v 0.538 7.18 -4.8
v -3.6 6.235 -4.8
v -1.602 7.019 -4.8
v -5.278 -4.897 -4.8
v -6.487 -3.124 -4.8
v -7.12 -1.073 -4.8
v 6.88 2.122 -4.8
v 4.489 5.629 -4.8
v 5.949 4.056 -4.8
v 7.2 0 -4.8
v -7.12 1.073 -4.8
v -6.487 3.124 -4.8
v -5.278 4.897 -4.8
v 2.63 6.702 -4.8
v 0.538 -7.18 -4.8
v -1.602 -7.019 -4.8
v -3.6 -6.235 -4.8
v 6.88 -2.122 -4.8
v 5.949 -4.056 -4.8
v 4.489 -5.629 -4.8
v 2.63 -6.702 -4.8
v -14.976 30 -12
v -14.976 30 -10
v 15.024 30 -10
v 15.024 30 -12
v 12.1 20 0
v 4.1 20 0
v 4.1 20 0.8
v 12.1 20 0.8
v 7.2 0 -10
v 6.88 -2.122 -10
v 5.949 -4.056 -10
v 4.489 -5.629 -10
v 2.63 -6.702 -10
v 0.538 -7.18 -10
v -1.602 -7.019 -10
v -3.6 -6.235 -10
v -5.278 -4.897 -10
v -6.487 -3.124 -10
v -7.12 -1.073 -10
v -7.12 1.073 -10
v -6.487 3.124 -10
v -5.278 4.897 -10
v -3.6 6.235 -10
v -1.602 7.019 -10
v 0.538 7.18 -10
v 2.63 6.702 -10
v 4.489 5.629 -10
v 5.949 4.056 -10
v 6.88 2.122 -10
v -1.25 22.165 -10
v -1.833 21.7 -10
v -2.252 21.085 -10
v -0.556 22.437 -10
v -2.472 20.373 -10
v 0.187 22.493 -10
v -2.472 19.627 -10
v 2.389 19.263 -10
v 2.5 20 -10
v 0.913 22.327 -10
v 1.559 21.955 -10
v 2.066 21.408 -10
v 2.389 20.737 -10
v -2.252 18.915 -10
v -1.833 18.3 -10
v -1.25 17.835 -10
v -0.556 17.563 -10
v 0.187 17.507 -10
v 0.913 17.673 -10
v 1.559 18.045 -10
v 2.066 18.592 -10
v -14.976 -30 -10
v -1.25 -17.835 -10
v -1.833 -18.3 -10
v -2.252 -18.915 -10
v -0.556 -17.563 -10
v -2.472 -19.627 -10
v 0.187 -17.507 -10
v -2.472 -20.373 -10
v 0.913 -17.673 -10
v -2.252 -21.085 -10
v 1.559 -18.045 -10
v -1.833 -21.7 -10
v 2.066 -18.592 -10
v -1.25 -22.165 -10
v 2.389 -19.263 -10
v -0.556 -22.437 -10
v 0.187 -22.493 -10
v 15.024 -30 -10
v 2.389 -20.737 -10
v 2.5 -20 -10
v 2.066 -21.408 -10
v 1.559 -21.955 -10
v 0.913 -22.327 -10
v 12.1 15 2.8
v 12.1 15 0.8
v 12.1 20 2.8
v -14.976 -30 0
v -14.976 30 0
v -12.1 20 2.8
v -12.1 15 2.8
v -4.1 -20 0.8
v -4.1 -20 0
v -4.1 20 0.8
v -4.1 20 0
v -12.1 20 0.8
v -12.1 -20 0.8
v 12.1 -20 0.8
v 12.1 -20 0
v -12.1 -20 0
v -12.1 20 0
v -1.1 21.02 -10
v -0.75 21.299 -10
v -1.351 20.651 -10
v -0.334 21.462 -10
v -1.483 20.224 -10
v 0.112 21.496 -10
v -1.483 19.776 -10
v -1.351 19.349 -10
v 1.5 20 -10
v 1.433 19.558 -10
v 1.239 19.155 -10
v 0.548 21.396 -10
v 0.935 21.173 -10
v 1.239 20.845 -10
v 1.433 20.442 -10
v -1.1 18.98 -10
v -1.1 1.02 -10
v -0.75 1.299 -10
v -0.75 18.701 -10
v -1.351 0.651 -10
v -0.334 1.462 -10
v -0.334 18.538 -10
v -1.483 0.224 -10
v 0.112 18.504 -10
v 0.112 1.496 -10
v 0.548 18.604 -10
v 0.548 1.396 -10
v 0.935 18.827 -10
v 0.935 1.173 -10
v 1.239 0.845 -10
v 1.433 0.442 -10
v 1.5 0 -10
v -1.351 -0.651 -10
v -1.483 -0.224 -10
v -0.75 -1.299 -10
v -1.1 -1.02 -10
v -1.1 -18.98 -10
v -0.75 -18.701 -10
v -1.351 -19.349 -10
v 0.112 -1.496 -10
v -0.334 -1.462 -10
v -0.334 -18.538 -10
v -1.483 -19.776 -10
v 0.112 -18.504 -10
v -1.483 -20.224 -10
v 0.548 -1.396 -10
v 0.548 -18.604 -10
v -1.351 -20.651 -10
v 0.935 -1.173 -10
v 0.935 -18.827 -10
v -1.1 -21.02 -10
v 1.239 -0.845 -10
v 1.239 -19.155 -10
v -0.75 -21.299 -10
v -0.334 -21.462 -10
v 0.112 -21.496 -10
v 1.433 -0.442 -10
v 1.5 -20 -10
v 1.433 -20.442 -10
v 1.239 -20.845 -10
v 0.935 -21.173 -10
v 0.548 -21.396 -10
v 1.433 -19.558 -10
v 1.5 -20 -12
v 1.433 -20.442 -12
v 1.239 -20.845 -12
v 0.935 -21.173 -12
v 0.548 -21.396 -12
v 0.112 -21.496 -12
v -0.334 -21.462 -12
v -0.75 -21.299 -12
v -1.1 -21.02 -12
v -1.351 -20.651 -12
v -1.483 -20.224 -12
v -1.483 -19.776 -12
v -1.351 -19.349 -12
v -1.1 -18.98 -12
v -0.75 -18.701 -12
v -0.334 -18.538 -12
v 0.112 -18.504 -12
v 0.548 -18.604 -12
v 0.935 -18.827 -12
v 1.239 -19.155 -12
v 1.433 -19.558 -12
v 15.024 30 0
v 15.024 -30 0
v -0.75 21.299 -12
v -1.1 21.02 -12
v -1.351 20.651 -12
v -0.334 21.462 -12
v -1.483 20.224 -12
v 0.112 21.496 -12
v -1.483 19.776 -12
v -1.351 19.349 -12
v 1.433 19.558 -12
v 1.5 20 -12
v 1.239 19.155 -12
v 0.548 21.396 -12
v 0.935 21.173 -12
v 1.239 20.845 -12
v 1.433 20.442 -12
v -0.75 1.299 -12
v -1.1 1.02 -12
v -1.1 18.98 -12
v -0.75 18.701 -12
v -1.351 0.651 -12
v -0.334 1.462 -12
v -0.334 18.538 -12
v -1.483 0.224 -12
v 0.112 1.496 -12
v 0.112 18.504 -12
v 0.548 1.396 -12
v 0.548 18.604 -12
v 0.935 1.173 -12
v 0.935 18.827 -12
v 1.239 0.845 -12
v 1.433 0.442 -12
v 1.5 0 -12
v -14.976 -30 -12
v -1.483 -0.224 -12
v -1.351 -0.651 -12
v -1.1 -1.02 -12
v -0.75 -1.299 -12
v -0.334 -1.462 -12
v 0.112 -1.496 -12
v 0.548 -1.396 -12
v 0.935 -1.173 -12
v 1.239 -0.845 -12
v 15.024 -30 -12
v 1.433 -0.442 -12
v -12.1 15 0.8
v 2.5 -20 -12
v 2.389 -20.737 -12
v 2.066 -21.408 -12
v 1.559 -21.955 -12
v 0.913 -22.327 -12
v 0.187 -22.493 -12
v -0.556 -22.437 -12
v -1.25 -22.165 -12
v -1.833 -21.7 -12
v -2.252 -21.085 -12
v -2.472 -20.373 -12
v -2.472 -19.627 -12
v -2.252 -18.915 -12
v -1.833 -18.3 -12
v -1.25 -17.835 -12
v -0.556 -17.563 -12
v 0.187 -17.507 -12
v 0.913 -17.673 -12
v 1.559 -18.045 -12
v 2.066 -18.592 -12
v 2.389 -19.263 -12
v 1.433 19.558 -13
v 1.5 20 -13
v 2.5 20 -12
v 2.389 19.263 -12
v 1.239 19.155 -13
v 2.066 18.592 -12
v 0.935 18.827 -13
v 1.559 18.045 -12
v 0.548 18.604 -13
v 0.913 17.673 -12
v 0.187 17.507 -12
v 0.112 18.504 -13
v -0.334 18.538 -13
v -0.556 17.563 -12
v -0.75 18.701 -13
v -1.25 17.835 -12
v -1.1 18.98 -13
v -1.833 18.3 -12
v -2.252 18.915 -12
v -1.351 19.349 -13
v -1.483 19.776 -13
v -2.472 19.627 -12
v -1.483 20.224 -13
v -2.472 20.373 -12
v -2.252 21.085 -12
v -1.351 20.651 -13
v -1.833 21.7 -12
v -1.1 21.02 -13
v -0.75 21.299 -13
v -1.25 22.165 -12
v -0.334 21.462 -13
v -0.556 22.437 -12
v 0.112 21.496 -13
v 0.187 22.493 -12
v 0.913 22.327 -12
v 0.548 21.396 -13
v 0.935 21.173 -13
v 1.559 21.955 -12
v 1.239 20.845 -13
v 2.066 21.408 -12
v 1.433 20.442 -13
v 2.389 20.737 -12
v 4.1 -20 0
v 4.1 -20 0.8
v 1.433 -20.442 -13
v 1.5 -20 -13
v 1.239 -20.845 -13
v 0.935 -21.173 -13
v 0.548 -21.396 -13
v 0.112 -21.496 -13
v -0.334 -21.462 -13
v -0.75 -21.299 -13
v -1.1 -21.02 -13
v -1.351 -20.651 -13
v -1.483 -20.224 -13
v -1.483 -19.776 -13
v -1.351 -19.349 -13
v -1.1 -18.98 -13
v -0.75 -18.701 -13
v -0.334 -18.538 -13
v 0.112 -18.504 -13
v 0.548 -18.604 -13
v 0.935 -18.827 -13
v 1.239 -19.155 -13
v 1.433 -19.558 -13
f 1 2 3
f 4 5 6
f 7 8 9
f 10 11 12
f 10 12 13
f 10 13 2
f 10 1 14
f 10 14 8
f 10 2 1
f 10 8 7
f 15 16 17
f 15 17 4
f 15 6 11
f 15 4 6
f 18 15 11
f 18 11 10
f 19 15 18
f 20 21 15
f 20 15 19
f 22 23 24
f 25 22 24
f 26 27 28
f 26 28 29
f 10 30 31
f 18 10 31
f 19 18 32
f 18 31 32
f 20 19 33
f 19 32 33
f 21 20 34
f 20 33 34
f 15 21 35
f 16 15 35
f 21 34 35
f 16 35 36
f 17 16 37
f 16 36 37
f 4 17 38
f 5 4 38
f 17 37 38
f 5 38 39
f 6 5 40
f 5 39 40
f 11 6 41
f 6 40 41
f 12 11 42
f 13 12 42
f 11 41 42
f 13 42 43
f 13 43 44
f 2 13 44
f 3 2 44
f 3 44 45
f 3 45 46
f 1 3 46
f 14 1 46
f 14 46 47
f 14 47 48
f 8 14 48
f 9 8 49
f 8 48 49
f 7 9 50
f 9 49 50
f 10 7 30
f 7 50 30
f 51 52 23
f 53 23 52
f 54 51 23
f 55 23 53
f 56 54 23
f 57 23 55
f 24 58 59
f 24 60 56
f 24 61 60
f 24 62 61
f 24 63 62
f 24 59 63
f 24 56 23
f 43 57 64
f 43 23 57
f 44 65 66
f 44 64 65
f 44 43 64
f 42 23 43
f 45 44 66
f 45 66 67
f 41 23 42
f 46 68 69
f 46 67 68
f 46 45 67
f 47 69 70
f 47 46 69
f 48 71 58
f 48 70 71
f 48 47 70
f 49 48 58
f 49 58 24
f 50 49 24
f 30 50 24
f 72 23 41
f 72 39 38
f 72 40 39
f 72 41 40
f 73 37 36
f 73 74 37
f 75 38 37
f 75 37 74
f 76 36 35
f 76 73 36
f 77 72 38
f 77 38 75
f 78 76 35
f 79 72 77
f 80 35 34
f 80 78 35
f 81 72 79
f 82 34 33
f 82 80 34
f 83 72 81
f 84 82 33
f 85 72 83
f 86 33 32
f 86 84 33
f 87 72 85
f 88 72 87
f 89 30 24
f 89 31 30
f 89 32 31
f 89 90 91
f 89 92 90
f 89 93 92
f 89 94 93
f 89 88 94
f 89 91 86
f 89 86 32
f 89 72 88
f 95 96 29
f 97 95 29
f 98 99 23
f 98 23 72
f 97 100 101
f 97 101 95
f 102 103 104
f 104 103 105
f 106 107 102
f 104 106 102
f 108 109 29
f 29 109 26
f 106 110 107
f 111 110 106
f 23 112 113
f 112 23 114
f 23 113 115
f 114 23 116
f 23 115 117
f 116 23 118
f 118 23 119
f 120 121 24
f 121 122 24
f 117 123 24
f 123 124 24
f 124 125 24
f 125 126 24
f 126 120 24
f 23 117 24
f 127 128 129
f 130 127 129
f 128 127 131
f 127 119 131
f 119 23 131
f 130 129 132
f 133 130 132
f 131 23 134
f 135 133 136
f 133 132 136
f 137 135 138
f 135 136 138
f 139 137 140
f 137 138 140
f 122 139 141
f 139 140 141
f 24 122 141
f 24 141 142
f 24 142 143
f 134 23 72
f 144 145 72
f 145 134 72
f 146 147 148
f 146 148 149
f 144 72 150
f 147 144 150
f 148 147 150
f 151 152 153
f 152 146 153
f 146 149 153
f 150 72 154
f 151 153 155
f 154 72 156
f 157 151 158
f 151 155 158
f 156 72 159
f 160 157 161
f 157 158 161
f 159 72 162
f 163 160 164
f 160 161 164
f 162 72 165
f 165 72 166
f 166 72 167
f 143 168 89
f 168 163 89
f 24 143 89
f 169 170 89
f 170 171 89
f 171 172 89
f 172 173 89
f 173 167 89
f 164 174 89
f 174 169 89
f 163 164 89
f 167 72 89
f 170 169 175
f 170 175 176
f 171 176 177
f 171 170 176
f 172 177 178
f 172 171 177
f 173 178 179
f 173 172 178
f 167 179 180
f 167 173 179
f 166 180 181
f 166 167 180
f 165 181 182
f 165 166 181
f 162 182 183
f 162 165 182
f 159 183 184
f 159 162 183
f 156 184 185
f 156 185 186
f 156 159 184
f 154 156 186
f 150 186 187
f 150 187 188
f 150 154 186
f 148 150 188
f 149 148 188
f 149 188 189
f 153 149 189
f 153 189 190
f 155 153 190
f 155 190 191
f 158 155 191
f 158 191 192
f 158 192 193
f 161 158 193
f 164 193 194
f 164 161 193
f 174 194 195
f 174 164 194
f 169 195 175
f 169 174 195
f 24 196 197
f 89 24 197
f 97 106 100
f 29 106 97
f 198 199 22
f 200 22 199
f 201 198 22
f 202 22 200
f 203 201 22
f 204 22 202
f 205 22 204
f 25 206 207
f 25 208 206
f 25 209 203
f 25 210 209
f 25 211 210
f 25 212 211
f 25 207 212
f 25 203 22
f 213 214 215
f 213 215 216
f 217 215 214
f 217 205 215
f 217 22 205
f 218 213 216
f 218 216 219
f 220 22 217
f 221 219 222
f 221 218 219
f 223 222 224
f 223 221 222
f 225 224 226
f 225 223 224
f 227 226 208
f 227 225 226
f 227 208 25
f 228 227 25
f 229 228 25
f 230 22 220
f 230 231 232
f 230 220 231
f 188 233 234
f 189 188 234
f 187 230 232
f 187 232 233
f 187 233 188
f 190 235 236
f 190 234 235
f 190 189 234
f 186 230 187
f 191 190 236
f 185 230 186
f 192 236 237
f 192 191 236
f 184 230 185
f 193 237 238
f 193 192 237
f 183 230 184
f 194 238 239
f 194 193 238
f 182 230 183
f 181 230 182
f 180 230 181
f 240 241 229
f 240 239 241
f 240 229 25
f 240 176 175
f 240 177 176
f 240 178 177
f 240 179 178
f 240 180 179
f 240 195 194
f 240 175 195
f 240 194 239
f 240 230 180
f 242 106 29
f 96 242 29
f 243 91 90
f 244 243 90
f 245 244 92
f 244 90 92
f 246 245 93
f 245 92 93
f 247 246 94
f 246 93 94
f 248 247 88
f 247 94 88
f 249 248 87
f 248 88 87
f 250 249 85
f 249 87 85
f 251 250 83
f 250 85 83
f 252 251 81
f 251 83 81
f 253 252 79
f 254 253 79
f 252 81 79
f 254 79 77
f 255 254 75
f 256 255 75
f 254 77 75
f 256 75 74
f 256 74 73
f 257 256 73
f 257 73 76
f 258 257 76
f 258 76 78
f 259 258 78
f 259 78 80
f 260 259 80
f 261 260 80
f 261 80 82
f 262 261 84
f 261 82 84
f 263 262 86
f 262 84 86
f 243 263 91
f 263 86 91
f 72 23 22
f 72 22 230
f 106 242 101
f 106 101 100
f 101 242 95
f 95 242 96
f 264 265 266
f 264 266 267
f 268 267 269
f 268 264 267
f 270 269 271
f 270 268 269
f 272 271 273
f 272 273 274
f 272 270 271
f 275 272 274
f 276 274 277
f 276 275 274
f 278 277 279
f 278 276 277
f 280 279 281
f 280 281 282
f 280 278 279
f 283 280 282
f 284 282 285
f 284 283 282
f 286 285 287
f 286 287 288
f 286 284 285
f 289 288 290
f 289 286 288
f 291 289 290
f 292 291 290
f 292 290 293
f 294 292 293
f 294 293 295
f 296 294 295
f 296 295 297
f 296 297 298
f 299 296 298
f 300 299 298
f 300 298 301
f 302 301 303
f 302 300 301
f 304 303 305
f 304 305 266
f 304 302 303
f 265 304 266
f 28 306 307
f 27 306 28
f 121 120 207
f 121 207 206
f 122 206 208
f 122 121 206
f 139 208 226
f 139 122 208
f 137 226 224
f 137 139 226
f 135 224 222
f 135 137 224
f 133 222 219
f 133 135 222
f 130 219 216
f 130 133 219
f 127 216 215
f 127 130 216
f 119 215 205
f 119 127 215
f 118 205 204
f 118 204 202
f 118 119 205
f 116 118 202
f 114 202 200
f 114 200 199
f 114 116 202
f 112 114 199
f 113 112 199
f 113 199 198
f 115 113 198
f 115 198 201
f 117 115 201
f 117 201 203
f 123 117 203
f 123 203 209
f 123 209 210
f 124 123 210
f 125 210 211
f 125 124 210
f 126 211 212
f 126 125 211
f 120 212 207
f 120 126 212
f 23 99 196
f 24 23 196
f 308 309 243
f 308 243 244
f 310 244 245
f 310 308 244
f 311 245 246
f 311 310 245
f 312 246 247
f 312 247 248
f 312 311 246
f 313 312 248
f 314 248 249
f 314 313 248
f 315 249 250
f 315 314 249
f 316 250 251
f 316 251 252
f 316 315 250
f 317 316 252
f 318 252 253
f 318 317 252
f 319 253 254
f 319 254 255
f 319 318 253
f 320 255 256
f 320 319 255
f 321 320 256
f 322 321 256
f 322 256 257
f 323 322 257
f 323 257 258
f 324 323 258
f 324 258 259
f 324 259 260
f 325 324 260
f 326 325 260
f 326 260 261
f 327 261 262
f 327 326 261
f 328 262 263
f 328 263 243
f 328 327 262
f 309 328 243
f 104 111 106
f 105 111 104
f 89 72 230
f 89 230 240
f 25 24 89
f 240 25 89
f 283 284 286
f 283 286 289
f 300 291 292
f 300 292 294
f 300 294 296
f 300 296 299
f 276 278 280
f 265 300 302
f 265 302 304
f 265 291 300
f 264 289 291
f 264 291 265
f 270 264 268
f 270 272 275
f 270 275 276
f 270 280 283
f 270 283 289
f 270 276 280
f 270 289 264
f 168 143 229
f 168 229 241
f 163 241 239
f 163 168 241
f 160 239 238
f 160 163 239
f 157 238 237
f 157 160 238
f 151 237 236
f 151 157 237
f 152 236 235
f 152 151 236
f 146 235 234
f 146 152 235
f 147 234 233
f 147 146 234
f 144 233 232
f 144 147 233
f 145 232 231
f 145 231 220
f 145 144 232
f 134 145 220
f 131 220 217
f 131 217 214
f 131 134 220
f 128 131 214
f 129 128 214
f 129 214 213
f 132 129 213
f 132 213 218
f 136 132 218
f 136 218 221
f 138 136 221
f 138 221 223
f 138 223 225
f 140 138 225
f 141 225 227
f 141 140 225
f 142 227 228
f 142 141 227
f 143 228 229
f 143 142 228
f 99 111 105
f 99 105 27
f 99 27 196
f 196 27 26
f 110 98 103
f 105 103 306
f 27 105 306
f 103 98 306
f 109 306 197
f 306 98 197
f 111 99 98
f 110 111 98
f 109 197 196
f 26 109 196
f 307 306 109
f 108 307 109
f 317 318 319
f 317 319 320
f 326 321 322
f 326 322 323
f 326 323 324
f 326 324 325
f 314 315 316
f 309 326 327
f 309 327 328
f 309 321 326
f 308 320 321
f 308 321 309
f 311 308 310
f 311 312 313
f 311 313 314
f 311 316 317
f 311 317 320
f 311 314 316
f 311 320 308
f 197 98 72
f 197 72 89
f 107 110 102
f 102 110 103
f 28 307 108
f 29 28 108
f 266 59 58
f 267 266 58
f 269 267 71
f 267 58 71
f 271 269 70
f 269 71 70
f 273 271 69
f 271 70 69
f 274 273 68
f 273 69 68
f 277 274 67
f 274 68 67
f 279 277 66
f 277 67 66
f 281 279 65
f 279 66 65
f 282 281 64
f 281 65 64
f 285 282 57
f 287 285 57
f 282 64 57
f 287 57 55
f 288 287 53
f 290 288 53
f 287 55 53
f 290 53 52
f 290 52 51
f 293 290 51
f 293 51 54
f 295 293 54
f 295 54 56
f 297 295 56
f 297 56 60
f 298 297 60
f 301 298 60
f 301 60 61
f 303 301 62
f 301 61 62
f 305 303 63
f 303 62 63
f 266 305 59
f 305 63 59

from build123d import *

# Parameters (mm, degrees)
F0_W      = 8
F0_H      = 40
F1_DEPTH  = 0.8
F2_W      = 30
F2_H      = 60
F3_DEPTH  = 10
F4_W      = 24.2
F4_H      = 5
F5_DEPTH  = 2
F6_R      = 7.2
F7_DEPTH  = 5.2
F8_R      = 2.5
F9_DEPTH  = 3
F10_SIZE  = 1
F11_W     = 30
F11_H     = 60
F11_R     = 1.5
F12_DEPTH = 2


with BuildPart() as f1:
    # F0 (on Top) → F1 (new body)
    with BuildSketch(Plane.XY):
        with Locations((-8.1, 0)):
            Rectangle(F0_W, F0_H)
        with Locations((8.1, 0)):
            Rectangle(F0_W, F0_H)
    extrude(amount=F1_DEPTH)

    # F2 (on face) → F3 (join)
    with BuildSketch(Plane(origin=(0, 0, 0), x_dir=(1, 0, 0), z_dir=(0, 0, -1))):
        with Locations((0.024011, 0)):
            Rectangle(F2_W, F2_H)
    extrude(amount=F3_DEPTH)

    # F6 (on face) → F7 (cut)
    with BuildSketch(Plane(origin=(0, 0, -10), x_dir=(1, 0, 0), z_dir=(0, 0, -1))):
        Circle(F6_R)
    extrude(amount=-F7_DEPTH, mode=Mode.SUBTRACT)

    # F8 (on face) → F9 (join)
    with BuildSketch(Plane(origin=(0, 0, -10), x_dir=(1, 0, 0), z_dir=(0, 0, -1))):
        with Locations((0, 20)):
            Circle(F8_R)
        with Locations((0, -20)):
            Circle(F8_R)
    extrude(amount=F9_DEPTH)

    # F10
    f10_edges = [f1.edges().sort_by_distance(p)[0] for p in [
        (-2.5, -20, -13),
        (-2.5, 20, -13),
    ]]
    chamfer(f10_edges, length=F10_SIZE)


with BuildPart() as f5:
    # F4 (on face) → F5 (new body)
    with BuildSketch(Plane.XY.offset(0.8)):
        with Locations((0, 17.5)):
            Rectangle(F4_W, F4_H)
    extrude(amount=F5_DEPTH)


with BuildPart() as f12:
    # F11 (on face) → F12 (new body)
    with BuildSketch(Plane(origin=(0, 0, -10), x_dir=(1, 0, 0), z_dir=(0, 0, -1))):
        with Locations((0.024011, 0)):
            Rectangle(F11_W, F11_H)
        with Locations((0, -20)):
            Circle(F11_R, mode=Mode.SUBTRACT)
        Circle(F11_R, mode=Mode.SUBTRACT)
        with Locations((0, 20)):
            Circle(F11_R, mode=Mode.SUBTRACT)
    extrude(amount=F12_DEPTH)


solid = Compound([f1.part, f5.part, f12.part])
